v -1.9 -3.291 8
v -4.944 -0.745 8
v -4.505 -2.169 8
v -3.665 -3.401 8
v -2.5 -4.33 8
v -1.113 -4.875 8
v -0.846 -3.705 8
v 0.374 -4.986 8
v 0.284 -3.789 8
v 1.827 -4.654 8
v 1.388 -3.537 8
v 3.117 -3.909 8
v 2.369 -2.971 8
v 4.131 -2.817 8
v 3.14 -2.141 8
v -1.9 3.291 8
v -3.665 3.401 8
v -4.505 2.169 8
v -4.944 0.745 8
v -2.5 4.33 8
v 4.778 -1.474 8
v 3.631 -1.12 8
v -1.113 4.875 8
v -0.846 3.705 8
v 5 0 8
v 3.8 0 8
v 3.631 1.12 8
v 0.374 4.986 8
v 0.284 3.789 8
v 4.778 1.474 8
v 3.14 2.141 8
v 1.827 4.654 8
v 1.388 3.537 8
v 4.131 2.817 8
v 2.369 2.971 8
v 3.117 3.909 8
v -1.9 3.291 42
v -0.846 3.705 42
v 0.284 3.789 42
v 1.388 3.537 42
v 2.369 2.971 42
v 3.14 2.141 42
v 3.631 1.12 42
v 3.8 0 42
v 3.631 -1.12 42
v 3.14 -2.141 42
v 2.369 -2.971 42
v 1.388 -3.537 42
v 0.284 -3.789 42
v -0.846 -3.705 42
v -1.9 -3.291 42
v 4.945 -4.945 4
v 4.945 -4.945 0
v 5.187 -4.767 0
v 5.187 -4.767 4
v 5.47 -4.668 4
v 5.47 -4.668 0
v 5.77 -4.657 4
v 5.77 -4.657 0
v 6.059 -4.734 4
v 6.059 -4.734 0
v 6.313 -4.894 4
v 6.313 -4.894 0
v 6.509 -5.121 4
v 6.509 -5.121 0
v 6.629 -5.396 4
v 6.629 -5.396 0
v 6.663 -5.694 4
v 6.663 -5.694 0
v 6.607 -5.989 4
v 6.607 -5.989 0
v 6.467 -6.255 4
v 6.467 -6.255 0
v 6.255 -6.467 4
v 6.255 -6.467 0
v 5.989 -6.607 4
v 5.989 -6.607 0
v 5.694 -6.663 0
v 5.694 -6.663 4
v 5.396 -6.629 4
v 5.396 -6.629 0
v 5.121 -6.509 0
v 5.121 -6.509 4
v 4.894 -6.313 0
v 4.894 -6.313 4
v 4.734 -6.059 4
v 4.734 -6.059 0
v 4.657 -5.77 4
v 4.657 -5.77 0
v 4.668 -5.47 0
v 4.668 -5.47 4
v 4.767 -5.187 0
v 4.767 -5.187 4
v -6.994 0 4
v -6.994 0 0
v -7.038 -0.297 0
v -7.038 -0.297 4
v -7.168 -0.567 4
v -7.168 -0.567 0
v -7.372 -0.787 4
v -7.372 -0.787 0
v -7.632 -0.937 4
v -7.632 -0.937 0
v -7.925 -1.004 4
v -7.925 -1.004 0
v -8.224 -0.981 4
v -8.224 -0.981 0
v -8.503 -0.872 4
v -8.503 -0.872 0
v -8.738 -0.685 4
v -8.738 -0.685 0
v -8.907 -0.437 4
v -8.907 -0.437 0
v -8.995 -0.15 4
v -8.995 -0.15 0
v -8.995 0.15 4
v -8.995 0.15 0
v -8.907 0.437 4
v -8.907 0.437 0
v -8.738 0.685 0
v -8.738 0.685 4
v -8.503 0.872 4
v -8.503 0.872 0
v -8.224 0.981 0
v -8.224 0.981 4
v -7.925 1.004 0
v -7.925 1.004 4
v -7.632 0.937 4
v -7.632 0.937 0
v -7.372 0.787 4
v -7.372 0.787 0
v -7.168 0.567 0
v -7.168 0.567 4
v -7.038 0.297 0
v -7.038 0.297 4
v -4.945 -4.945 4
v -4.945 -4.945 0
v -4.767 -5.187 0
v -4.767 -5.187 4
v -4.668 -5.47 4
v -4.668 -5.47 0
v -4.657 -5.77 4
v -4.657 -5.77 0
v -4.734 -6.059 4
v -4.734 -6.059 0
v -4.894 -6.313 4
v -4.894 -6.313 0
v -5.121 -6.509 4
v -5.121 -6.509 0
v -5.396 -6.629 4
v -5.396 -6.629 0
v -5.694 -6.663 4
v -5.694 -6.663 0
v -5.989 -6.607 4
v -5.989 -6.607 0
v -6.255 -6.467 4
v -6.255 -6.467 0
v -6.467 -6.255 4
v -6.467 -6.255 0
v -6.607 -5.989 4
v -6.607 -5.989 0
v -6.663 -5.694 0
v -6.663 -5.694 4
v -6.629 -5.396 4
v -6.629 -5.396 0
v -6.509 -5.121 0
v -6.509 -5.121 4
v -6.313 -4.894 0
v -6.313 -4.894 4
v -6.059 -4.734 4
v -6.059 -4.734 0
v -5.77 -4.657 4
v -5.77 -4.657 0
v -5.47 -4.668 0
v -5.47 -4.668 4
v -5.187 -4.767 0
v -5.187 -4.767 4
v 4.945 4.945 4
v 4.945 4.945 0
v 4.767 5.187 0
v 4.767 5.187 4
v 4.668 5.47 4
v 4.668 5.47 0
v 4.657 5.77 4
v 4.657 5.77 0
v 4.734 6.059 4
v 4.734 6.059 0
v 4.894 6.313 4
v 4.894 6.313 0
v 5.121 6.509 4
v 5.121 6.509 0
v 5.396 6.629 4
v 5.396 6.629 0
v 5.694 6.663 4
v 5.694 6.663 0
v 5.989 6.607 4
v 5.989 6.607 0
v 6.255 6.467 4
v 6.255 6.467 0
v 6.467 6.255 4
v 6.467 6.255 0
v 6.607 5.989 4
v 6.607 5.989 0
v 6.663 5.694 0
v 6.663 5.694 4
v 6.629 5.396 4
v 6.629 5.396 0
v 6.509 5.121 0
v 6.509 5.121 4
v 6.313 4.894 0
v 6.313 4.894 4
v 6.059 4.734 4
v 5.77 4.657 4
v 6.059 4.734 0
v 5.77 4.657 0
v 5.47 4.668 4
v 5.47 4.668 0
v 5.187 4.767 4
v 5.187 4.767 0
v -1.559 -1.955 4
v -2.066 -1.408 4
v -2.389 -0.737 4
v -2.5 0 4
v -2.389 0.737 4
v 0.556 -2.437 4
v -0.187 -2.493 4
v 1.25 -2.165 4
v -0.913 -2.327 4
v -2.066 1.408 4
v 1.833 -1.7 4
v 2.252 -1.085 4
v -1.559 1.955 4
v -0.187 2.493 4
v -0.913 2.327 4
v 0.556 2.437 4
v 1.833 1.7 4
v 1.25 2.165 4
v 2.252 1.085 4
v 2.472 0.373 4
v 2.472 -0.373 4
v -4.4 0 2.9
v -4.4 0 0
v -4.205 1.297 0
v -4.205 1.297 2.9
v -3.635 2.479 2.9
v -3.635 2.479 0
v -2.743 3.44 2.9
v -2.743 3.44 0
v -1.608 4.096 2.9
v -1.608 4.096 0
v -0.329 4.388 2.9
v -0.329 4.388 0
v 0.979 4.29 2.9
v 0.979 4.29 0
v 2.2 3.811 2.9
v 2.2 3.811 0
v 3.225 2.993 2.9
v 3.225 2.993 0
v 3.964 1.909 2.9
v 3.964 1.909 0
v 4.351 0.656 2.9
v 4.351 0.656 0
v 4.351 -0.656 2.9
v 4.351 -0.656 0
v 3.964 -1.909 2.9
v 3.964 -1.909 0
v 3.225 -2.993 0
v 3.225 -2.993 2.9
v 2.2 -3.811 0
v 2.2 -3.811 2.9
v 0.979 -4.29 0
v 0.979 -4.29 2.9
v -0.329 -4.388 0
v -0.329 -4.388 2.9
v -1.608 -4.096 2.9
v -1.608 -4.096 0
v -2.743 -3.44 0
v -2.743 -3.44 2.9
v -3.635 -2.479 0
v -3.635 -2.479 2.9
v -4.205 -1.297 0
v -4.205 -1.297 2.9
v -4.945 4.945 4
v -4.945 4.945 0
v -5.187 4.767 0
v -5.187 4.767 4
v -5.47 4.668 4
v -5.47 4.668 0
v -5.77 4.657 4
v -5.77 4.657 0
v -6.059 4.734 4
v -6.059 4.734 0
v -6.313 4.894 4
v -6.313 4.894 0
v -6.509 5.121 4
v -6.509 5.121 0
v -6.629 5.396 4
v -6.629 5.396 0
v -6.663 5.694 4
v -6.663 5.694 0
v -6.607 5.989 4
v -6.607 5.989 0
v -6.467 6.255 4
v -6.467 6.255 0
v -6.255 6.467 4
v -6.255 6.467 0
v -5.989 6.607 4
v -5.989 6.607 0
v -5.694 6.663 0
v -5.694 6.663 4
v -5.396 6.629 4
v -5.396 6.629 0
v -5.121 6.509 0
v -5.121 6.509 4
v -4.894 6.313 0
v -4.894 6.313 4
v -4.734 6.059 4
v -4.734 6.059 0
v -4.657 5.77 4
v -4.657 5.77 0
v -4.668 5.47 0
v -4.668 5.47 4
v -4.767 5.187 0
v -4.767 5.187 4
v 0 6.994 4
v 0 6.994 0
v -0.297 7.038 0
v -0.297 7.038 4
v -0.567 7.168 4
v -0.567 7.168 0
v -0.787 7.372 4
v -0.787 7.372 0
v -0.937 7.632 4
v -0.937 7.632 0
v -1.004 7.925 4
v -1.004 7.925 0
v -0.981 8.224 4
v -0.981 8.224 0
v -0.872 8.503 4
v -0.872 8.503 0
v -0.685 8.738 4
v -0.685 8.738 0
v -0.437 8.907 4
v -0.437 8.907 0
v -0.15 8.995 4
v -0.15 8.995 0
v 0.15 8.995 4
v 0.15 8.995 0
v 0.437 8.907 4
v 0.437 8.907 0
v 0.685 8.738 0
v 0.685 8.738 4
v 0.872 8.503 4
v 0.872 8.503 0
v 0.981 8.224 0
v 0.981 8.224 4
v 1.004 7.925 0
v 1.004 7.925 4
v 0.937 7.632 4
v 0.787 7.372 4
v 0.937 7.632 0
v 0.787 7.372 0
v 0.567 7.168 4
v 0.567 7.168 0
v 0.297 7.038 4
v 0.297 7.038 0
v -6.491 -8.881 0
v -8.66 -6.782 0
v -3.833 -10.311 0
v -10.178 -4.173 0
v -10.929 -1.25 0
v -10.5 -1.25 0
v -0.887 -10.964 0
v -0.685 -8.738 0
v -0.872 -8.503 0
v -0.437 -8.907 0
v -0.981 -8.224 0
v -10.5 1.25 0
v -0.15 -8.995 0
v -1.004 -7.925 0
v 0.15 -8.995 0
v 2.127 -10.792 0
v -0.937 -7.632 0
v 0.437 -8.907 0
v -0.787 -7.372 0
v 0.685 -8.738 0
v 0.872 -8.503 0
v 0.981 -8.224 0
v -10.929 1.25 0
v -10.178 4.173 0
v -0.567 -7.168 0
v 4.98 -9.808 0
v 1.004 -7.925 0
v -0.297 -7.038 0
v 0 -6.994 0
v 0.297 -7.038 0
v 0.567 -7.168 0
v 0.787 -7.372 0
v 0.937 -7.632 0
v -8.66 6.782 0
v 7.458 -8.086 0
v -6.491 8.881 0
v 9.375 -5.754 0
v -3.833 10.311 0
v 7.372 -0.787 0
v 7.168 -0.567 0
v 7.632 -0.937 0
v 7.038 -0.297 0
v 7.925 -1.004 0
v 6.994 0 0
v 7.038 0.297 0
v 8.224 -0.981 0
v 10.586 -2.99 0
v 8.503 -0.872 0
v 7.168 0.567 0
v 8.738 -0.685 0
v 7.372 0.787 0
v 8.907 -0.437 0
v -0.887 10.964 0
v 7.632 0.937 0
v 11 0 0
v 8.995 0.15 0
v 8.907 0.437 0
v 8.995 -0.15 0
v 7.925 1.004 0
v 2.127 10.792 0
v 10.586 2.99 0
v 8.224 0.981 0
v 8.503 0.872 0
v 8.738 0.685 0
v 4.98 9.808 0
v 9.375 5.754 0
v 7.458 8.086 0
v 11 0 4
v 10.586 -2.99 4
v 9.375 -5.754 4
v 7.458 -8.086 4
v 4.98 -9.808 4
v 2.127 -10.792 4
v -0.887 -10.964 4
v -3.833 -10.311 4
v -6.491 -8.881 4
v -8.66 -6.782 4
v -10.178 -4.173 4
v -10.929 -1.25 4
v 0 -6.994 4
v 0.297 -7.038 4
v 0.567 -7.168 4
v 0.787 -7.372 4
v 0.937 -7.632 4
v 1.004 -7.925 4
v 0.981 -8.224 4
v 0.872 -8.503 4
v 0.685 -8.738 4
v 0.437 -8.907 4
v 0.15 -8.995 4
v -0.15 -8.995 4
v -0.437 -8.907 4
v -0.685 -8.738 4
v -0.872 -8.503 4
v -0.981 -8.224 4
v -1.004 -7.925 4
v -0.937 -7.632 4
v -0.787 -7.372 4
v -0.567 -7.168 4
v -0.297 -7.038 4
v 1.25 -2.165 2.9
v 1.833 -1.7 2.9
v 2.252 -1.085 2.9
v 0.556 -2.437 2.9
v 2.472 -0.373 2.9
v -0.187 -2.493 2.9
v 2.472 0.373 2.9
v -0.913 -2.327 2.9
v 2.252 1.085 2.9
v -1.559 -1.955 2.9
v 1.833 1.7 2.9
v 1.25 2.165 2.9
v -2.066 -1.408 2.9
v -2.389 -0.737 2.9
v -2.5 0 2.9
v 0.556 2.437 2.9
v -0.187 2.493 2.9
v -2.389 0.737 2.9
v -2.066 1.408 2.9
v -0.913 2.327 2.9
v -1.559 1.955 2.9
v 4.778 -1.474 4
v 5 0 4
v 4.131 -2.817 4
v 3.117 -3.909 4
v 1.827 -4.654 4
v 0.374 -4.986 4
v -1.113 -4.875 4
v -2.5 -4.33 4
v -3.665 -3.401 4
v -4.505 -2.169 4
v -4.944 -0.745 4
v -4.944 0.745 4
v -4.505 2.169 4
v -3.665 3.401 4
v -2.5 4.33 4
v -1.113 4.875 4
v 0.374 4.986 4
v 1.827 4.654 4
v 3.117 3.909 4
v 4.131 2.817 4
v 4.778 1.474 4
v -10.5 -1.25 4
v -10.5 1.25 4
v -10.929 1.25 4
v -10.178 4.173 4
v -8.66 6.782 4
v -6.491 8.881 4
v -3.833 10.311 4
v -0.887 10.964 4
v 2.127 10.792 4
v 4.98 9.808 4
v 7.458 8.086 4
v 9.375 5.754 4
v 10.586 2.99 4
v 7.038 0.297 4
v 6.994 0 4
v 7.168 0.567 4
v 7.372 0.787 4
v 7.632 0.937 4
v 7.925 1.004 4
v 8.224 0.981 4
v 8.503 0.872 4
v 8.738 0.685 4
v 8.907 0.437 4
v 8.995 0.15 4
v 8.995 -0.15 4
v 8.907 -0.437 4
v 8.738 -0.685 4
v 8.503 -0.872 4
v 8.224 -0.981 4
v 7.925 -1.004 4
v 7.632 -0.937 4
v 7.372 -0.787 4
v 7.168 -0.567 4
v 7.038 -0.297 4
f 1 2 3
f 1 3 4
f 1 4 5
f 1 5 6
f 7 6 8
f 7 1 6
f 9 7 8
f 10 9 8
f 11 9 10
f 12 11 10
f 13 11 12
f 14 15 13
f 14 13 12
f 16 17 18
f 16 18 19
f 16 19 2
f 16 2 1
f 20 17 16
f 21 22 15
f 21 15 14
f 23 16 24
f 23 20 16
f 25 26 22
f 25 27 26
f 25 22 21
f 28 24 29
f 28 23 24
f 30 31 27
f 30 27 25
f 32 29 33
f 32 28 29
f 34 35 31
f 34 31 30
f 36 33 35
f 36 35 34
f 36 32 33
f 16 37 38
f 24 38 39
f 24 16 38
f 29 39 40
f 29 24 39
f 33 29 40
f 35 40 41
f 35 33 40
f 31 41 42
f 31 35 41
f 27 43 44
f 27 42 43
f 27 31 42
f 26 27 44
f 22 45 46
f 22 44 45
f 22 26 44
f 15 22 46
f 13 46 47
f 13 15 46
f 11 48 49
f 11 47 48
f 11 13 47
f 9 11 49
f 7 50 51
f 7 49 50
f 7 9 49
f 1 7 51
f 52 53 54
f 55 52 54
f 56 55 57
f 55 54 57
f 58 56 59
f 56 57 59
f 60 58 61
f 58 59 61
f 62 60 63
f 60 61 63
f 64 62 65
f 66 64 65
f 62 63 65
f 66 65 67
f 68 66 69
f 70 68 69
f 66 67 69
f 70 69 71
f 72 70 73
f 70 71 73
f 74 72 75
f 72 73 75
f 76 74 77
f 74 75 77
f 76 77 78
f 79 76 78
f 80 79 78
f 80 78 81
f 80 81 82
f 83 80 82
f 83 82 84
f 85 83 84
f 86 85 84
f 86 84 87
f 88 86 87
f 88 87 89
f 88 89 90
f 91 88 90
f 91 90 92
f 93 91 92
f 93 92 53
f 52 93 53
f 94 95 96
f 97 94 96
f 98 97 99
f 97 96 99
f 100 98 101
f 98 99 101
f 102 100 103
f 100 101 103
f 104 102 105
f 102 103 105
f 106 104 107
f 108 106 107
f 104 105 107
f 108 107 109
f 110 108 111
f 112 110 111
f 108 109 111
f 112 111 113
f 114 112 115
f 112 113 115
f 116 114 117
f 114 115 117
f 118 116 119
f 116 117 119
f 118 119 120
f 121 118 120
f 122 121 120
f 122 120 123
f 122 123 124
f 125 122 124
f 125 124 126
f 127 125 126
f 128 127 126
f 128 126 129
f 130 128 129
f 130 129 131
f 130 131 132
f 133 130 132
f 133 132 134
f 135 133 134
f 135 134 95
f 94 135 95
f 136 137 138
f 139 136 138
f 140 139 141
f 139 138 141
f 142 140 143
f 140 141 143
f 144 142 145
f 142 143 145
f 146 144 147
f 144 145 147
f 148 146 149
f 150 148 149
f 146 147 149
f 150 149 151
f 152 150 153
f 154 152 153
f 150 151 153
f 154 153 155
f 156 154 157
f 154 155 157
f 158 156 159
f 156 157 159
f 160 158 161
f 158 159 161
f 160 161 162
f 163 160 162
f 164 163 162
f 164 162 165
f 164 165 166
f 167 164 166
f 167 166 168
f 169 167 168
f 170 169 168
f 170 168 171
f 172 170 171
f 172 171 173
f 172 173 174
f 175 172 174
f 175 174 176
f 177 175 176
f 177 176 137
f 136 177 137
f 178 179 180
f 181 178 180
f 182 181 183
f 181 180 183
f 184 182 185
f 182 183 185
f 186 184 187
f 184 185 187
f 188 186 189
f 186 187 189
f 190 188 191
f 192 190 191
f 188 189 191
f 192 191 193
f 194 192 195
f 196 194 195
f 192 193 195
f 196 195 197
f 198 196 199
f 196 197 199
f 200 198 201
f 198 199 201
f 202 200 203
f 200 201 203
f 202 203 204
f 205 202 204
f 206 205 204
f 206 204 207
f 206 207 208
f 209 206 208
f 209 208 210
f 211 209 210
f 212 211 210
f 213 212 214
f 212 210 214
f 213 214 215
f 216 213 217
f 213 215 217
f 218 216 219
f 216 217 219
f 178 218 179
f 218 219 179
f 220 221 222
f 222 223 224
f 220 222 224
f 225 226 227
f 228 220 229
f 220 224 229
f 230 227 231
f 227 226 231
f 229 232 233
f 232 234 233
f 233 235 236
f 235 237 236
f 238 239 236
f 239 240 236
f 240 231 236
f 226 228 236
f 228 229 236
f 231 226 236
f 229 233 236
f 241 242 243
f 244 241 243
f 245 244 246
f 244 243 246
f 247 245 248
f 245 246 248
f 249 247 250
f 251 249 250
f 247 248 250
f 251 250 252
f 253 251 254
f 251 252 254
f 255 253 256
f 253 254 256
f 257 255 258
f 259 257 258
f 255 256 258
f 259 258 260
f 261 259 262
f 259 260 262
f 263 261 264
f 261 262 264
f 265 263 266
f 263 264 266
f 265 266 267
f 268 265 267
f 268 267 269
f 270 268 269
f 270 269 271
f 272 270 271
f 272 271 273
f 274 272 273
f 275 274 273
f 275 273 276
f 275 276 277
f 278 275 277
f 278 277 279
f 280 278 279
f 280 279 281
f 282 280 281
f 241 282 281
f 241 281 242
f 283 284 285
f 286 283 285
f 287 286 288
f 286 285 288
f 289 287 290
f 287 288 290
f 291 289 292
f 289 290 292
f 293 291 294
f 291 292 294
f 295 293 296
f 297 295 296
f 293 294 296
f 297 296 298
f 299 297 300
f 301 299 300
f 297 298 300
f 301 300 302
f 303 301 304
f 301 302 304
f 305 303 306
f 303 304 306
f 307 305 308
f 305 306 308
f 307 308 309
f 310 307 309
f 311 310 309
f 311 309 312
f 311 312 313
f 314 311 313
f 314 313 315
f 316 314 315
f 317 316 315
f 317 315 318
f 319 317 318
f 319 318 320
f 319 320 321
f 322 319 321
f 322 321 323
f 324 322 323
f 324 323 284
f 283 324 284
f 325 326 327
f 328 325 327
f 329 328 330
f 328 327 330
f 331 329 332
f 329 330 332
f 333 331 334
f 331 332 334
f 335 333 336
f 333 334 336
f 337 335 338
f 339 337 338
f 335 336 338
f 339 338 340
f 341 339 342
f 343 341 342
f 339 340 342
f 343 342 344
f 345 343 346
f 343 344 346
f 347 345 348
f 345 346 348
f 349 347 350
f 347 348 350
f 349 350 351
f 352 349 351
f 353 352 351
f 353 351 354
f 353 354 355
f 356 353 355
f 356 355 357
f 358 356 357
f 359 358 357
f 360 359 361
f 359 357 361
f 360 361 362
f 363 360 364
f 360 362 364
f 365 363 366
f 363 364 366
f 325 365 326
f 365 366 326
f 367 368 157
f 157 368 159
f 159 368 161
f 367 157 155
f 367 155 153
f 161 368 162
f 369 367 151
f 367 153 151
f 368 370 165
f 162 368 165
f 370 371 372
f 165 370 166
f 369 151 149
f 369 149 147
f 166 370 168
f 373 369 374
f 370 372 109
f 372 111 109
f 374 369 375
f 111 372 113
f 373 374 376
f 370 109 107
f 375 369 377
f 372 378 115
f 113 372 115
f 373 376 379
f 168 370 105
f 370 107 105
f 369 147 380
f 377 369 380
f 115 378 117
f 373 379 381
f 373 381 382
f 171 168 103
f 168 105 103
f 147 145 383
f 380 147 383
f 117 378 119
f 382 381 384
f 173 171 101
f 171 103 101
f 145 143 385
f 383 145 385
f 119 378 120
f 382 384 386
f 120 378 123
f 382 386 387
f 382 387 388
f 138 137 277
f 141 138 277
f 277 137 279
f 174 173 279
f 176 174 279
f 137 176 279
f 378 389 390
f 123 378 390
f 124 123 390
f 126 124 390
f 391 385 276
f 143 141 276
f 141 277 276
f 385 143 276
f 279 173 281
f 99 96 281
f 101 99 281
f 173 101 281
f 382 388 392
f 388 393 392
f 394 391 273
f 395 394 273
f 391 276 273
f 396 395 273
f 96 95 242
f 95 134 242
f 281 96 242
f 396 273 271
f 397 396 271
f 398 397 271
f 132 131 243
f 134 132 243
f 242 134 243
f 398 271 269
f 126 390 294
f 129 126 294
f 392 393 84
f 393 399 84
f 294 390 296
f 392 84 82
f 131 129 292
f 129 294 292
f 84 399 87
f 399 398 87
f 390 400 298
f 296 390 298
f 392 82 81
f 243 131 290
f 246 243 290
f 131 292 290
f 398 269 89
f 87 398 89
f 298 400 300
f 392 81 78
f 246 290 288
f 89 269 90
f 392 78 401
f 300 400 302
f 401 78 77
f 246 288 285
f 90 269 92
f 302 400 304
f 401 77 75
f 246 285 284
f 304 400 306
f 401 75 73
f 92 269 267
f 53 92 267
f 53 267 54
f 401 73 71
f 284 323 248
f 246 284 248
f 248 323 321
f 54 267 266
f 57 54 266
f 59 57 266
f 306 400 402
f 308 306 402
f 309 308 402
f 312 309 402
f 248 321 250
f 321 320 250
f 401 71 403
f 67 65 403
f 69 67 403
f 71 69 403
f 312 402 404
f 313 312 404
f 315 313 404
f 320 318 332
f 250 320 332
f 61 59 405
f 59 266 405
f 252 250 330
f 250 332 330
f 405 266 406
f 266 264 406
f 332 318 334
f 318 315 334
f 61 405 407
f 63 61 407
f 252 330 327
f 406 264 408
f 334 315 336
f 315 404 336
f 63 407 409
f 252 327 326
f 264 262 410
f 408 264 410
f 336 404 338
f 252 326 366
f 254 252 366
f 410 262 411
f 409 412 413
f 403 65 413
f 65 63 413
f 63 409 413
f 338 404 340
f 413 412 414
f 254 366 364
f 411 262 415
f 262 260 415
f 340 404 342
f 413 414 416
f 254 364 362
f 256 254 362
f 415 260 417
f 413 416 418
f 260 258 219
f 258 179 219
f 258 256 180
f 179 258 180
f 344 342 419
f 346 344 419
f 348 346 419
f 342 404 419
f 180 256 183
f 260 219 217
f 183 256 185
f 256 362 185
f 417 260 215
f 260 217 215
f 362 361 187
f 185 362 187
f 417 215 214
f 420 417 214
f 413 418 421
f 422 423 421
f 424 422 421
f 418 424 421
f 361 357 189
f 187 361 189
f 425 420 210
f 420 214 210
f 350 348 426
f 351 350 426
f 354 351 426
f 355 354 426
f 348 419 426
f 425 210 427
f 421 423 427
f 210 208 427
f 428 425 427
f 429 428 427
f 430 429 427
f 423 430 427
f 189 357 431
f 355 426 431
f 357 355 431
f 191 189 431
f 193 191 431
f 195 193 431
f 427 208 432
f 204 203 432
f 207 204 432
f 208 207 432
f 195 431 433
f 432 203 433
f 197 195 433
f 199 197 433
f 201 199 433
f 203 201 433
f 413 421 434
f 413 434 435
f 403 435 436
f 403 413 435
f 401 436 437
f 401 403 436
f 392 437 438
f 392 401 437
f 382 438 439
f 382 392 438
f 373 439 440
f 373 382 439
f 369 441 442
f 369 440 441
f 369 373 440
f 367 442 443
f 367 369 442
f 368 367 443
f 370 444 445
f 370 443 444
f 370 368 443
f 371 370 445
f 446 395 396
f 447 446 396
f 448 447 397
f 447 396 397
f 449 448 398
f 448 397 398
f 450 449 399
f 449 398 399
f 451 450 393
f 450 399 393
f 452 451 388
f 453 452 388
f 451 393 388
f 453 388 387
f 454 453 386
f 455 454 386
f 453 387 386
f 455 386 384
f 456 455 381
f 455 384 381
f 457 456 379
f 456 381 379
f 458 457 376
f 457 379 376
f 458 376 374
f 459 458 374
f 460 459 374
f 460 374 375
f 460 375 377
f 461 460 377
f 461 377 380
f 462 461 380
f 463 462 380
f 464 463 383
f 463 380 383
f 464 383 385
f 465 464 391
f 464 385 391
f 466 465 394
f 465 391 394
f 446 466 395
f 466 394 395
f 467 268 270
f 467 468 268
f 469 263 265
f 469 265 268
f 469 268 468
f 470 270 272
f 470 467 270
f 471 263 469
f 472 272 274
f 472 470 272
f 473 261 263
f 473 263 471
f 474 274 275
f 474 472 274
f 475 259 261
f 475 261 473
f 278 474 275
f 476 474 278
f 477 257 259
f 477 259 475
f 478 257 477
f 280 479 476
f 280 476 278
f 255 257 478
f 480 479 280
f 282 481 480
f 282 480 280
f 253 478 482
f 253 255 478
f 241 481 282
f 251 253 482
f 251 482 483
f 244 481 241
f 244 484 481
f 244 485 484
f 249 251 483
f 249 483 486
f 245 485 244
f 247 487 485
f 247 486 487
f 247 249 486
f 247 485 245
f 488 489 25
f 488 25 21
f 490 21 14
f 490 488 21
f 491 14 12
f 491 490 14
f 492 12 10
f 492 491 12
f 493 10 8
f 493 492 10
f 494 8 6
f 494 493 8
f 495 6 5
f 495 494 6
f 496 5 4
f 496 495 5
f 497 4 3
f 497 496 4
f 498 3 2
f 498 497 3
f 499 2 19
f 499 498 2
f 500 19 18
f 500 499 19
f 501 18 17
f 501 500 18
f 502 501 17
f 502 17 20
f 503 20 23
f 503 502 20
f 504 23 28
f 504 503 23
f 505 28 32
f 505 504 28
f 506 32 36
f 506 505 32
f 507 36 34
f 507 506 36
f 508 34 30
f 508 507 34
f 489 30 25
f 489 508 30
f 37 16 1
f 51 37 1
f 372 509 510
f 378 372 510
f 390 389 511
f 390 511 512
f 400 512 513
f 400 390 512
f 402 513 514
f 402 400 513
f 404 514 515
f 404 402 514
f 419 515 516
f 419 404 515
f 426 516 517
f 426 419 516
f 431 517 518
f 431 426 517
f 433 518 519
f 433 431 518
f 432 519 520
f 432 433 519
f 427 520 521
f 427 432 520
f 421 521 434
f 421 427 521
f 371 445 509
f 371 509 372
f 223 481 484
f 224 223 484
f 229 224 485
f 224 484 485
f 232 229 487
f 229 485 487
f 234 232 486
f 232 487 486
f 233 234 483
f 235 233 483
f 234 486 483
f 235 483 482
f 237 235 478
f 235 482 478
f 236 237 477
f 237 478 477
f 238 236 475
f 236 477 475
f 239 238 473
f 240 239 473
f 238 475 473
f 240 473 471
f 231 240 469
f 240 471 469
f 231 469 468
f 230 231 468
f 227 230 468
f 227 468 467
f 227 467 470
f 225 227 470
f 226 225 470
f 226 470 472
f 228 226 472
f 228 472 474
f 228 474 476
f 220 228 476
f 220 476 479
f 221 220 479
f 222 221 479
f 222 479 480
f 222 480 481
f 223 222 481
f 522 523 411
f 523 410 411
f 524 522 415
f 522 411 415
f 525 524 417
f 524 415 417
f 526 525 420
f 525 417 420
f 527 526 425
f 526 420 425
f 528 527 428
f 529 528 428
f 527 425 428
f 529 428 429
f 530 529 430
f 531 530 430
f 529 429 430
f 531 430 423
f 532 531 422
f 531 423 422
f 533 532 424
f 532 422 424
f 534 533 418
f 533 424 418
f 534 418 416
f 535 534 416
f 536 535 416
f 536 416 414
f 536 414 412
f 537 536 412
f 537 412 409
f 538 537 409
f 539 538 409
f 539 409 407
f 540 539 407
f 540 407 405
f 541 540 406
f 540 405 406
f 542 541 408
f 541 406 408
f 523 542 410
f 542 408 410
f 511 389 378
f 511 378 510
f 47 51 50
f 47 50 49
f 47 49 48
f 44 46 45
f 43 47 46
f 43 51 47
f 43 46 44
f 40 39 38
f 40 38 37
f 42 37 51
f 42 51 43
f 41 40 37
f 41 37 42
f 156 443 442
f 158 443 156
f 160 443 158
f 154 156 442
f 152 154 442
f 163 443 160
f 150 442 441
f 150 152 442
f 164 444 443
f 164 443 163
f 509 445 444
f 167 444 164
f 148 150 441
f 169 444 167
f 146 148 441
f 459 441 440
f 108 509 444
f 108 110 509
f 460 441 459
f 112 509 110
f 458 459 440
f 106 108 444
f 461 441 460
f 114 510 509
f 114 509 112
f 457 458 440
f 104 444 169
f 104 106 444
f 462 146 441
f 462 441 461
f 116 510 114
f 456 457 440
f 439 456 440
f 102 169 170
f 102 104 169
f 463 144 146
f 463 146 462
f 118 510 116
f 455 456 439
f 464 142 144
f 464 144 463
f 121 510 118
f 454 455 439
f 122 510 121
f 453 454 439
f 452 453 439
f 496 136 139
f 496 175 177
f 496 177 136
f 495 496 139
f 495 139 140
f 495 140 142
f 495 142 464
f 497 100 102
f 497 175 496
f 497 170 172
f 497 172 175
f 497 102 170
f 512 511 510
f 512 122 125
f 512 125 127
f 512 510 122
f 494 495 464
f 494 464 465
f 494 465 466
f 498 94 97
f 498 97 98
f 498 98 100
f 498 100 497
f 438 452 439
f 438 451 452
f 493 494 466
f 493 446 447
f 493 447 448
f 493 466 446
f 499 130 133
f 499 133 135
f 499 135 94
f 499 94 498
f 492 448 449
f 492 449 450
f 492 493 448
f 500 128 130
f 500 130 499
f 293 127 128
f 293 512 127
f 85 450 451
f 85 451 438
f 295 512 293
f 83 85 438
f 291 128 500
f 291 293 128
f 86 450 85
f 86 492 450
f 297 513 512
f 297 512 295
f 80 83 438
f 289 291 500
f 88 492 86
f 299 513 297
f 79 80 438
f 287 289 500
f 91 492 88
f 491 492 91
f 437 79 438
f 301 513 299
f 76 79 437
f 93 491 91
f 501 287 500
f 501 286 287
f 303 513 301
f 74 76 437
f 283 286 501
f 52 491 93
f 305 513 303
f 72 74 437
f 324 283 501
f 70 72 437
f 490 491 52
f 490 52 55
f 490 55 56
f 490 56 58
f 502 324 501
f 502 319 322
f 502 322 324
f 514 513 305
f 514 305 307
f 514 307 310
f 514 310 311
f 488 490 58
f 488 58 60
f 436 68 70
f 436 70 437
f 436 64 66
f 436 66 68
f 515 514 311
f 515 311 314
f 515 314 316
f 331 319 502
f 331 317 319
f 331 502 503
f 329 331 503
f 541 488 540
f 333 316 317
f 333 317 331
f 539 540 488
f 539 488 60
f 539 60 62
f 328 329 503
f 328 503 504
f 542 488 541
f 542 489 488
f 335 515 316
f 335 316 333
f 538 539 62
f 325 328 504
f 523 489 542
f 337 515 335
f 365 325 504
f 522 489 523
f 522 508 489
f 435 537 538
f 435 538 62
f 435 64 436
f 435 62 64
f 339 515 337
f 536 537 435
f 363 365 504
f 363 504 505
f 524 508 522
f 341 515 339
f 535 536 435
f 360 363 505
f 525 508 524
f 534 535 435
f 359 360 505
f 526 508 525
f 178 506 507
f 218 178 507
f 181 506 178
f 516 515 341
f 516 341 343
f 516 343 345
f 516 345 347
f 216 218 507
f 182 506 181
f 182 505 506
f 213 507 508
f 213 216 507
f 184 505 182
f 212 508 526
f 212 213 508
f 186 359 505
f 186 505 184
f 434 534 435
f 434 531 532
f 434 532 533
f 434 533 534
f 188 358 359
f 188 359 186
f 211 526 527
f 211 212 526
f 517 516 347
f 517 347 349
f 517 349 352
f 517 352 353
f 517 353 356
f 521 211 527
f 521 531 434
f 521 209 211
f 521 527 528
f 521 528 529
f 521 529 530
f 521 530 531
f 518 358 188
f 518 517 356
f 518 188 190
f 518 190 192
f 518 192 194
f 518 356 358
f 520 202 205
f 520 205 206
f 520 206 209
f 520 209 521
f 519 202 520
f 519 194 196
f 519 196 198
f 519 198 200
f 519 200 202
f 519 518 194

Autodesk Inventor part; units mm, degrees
ref_plane "XY Plane" through (0, 0, 0) normal (0, 0, 1) x (1, 0, 0)
sketch "Boceto1" plane through (0, 0, 0) normal (0, 0, 1) x (1, 0, 0)
  circle A0 centre (0, 0) radius 11
  dimension "d0" = 22
extrude "Extrusión1" add sketch "Boceto1" along normal blind 4
sketch "Boceto2" plane through (0, 0, 4) normal (0, 0, 1) x (1, 0, 0)
  line L0 (0, 0) -> (0, 8)
  circle A0 centre (0, 8) radius 1
  dimension "d3" = 8
  dimension "d4" = 2
hole "Agujero1" at (0, 8, 4) direction (0, 0, -1) diameter 2.013 end through all thread size "M2.5x0.45" class "6H" standard "ISO Metric profile"
pattern_circular "Patrón circular1" count 8 over 360 about axis through (0, 0, 0) along (0, 0, 1) of "Agujero1"
sketch "Boceto3" plane through (0, 0, 0) normal (0, 0, -1) x (-1, 0, 0)
  circle A0 centre (0, 0) radius 4.4
  dimension "d15" = 8.8
extrude "Extrusión2" cut sketch "Boceto3" against normal blind 2.9
sketch "Boceto4" plane through (0, 0, 2.9) normal (0, 0, -1) x (-1, 0, 0)
  circle A0 centre (0, 0) radius 2.5
  dimension "d18" = 5
extrude "Extrusión3" cut sketch "Boceto4" against normal blind 2.6
sketch "Boceto5" plane through (0, 0, 4) normal (0, 0, 1) x (1, 0, 0)
  circle A0 centre (0, 0) radius 5
  dimension "d21" = 10
extrude "Extrusión4" add sketch "Boceto5" along normal blind 4
sketch "Boceto6" plane through (0, 0, 8) normal (0, 0, 1) x (1, 0, 0)
  arc A0 (-1.9, -3.2909) -> (-1.9, 3.2909) centre (0, 0) ccw
  line L0 (0, 0) -> (-1.9, 0)
  line L1 (-1.9, 0) -> (-1.9, 3.2909)
  line L2 (-1.9, 0) -> (-1.9, -3.2909)
  dimension "DiametroEje" = 7.6
  dimension "d26" = 1.9
extrude "Extrusión5" add sketch "Boceto6" along normal blind 34
ref_plane "Plano de trabajo1" through (0, 11, 0) normal (0, 1, 0) x (-1, 0, 0)
ref_plane "Plano de trabajo2" through (-11, 0, 0) normal (1, 0, 0) x (0, 1, 0)
sketch "Boceto8" plane through (-11, 0, 0) normal (1, 0, 0) x (0, 1, 0)
  line L0 (-1.25, 0) -> (1.25, 0)
  line L1 (1.25, 0) -> (1.25, 4)
  line L2 (1.25, 4) -> (-1.25, 4)
  line L3 (-1.25, 4) -> (-1.25, 0)
  line L4 (-1.25, 0) -> (1.25, 4) construction
  line L5 (1.25, 0) -> (-1.25, 4) construction
  point P0 (0, 0)
  point P1 (0, 2)
  dimension "d33" = 2.5
  dimension "d34" = 4
extrude "Extrusión7" cut sketch "Boceto8" along normal blind 0.5
equation "\"d26\" = 0.25 * DiametroEje"
properties part number "BM-MX28" material "PETG"
